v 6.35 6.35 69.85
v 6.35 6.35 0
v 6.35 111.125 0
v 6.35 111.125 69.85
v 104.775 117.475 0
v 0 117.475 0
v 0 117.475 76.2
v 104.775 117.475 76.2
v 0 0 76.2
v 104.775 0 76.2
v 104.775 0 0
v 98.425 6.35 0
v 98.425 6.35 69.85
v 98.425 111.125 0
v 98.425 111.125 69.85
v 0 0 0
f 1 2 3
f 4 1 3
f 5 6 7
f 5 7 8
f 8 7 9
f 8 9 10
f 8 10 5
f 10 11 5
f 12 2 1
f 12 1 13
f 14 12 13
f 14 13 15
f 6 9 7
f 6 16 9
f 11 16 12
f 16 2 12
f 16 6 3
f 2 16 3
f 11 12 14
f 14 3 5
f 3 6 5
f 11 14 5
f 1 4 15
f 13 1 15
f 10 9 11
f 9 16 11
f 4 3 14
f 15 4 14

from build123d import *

# Parameters (mm, degrees)
F0_W     = 104.775
F0_H     = 117.475
F0_W_2   = 92.075
F0_H_2   = 104.775
F1_DEPTH = 69.85
F2_W     = 104.775
F2_H     = 117.475
F2_W_2   = 92.075
F2_H_2   = 104.775
F3_DEPTH = 6.35


with BuildPart() as f1:
    # F0 (on Top) → F1 (new body)
    with BuildSketch(Plane.XY):
        with Locations((52.3875, 58.7375)):
            Rectangle(F0_W, F0_H)
        with Locations((52.3875, 58.7375)):
            Rectangle(F0_W_2, F0_H_2, mode=Mode.SUBTRACT)
    extrude(amount=F1_DEPTH)

    # F2 (on face) → F3 (join)
    with BuildSketch(Plane.XY.offset(69.85)):
        with Locations((52.3875, 58.7375)):
            Rectangle(F2_W, F2_H)
        with Locations((52.3875, 58.7375)):
            Rectangle(F2_W_2, F2_H_2, mode=Mode.SUBTRACT)
        with Locations((52.3875, 58.7375)):
            Rectangle(F2_W_2, F2_H_2)
    extrude(amount=F3_DEPTH)


solid = f1.part
